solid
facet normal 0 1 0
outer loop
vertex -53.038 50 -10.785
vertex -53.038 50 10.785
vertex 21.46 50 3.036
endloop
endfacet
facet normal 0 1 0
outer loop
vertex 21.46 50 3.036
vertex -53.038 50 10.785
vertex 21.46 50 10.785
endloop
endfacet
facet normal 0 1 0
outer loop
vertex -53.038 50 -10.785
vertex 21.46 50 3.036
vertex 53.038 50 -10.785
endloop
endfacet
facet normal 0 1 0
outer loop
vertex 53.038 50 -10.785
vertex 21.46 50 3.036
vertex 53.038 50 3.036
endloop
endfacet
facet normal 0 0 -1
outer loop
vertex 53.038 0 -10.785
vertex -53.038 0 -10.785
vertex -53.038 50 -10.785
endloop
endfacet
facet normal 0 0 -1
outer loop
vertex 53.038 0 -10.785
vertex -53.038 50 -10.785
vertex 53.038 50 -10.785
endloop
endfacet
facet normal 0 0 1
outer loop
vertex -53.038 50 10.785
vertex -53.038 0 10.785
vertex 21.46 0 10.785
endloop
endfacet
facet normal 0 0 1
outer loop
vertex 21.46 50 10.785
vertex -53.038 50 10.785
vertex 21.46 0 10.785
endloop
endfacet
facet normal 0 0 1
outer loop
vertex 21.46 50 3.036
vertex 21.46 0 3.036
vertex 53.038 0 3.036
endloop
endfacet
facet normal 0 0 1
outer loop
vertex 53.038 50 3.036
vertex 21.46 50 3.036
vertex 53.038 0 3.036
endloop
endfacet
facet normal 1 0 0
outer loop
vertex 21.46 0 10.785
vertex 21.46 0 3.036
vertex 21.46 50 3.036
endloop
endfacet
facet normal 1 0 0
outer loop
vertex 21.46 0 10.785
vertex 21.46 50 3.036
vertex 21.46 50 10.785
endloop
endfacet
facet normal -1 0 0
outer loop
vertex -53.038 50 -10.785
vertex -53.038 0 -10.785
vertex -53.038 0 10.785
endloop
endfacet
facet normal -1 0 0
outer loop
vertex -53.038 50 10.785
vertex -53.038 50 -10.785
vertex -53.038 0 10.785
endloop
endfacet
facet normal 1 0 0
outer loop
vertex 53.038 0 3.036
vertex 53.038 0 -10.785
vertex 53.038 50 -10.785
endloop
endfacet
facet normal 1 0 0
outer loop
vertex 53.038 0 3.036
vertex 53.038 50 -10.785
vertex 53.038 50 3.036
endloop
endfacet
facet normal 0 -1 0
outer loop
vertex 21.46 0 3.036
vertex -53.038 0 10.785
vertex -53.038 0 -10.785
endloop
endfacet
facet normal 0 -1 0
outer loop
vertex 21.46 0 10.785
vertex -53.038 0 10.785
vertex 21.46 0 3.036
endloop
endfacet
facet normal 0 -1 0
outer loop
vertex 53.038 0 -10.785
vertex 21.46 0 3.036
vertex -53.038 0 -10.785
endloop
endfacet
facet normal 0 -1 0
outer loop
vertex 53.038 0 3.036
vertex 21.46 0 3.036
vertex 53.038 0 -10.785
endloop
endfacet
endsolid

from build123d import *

# Parameters (mm, degrees)
F0_W     = 106.075584
F0_H     = 21.569342
F1_DEPTH = 50
F2_W     = 31.57778
F2_H     = 7.749126
F3_DEPTH = 50


with BuildPart() as f1:
    # F0 (on Front) → F1 (new body)
    with BuildSketch(Plane.XZ):
        Rectangle(F0_W, F0_H)
    extrude(amount=-F1_DEPTH)

    # F2 (on face) → F3 (cut)
    with BuildSketch(Plane.XZ):
        with Locations((37.248902, 6.910108)):
            Rectangle(F2_W, F2_H)
    extrude(amount=-F3_DEPTH, mode=Mode.SUBTRACT)


solid = f1.part
